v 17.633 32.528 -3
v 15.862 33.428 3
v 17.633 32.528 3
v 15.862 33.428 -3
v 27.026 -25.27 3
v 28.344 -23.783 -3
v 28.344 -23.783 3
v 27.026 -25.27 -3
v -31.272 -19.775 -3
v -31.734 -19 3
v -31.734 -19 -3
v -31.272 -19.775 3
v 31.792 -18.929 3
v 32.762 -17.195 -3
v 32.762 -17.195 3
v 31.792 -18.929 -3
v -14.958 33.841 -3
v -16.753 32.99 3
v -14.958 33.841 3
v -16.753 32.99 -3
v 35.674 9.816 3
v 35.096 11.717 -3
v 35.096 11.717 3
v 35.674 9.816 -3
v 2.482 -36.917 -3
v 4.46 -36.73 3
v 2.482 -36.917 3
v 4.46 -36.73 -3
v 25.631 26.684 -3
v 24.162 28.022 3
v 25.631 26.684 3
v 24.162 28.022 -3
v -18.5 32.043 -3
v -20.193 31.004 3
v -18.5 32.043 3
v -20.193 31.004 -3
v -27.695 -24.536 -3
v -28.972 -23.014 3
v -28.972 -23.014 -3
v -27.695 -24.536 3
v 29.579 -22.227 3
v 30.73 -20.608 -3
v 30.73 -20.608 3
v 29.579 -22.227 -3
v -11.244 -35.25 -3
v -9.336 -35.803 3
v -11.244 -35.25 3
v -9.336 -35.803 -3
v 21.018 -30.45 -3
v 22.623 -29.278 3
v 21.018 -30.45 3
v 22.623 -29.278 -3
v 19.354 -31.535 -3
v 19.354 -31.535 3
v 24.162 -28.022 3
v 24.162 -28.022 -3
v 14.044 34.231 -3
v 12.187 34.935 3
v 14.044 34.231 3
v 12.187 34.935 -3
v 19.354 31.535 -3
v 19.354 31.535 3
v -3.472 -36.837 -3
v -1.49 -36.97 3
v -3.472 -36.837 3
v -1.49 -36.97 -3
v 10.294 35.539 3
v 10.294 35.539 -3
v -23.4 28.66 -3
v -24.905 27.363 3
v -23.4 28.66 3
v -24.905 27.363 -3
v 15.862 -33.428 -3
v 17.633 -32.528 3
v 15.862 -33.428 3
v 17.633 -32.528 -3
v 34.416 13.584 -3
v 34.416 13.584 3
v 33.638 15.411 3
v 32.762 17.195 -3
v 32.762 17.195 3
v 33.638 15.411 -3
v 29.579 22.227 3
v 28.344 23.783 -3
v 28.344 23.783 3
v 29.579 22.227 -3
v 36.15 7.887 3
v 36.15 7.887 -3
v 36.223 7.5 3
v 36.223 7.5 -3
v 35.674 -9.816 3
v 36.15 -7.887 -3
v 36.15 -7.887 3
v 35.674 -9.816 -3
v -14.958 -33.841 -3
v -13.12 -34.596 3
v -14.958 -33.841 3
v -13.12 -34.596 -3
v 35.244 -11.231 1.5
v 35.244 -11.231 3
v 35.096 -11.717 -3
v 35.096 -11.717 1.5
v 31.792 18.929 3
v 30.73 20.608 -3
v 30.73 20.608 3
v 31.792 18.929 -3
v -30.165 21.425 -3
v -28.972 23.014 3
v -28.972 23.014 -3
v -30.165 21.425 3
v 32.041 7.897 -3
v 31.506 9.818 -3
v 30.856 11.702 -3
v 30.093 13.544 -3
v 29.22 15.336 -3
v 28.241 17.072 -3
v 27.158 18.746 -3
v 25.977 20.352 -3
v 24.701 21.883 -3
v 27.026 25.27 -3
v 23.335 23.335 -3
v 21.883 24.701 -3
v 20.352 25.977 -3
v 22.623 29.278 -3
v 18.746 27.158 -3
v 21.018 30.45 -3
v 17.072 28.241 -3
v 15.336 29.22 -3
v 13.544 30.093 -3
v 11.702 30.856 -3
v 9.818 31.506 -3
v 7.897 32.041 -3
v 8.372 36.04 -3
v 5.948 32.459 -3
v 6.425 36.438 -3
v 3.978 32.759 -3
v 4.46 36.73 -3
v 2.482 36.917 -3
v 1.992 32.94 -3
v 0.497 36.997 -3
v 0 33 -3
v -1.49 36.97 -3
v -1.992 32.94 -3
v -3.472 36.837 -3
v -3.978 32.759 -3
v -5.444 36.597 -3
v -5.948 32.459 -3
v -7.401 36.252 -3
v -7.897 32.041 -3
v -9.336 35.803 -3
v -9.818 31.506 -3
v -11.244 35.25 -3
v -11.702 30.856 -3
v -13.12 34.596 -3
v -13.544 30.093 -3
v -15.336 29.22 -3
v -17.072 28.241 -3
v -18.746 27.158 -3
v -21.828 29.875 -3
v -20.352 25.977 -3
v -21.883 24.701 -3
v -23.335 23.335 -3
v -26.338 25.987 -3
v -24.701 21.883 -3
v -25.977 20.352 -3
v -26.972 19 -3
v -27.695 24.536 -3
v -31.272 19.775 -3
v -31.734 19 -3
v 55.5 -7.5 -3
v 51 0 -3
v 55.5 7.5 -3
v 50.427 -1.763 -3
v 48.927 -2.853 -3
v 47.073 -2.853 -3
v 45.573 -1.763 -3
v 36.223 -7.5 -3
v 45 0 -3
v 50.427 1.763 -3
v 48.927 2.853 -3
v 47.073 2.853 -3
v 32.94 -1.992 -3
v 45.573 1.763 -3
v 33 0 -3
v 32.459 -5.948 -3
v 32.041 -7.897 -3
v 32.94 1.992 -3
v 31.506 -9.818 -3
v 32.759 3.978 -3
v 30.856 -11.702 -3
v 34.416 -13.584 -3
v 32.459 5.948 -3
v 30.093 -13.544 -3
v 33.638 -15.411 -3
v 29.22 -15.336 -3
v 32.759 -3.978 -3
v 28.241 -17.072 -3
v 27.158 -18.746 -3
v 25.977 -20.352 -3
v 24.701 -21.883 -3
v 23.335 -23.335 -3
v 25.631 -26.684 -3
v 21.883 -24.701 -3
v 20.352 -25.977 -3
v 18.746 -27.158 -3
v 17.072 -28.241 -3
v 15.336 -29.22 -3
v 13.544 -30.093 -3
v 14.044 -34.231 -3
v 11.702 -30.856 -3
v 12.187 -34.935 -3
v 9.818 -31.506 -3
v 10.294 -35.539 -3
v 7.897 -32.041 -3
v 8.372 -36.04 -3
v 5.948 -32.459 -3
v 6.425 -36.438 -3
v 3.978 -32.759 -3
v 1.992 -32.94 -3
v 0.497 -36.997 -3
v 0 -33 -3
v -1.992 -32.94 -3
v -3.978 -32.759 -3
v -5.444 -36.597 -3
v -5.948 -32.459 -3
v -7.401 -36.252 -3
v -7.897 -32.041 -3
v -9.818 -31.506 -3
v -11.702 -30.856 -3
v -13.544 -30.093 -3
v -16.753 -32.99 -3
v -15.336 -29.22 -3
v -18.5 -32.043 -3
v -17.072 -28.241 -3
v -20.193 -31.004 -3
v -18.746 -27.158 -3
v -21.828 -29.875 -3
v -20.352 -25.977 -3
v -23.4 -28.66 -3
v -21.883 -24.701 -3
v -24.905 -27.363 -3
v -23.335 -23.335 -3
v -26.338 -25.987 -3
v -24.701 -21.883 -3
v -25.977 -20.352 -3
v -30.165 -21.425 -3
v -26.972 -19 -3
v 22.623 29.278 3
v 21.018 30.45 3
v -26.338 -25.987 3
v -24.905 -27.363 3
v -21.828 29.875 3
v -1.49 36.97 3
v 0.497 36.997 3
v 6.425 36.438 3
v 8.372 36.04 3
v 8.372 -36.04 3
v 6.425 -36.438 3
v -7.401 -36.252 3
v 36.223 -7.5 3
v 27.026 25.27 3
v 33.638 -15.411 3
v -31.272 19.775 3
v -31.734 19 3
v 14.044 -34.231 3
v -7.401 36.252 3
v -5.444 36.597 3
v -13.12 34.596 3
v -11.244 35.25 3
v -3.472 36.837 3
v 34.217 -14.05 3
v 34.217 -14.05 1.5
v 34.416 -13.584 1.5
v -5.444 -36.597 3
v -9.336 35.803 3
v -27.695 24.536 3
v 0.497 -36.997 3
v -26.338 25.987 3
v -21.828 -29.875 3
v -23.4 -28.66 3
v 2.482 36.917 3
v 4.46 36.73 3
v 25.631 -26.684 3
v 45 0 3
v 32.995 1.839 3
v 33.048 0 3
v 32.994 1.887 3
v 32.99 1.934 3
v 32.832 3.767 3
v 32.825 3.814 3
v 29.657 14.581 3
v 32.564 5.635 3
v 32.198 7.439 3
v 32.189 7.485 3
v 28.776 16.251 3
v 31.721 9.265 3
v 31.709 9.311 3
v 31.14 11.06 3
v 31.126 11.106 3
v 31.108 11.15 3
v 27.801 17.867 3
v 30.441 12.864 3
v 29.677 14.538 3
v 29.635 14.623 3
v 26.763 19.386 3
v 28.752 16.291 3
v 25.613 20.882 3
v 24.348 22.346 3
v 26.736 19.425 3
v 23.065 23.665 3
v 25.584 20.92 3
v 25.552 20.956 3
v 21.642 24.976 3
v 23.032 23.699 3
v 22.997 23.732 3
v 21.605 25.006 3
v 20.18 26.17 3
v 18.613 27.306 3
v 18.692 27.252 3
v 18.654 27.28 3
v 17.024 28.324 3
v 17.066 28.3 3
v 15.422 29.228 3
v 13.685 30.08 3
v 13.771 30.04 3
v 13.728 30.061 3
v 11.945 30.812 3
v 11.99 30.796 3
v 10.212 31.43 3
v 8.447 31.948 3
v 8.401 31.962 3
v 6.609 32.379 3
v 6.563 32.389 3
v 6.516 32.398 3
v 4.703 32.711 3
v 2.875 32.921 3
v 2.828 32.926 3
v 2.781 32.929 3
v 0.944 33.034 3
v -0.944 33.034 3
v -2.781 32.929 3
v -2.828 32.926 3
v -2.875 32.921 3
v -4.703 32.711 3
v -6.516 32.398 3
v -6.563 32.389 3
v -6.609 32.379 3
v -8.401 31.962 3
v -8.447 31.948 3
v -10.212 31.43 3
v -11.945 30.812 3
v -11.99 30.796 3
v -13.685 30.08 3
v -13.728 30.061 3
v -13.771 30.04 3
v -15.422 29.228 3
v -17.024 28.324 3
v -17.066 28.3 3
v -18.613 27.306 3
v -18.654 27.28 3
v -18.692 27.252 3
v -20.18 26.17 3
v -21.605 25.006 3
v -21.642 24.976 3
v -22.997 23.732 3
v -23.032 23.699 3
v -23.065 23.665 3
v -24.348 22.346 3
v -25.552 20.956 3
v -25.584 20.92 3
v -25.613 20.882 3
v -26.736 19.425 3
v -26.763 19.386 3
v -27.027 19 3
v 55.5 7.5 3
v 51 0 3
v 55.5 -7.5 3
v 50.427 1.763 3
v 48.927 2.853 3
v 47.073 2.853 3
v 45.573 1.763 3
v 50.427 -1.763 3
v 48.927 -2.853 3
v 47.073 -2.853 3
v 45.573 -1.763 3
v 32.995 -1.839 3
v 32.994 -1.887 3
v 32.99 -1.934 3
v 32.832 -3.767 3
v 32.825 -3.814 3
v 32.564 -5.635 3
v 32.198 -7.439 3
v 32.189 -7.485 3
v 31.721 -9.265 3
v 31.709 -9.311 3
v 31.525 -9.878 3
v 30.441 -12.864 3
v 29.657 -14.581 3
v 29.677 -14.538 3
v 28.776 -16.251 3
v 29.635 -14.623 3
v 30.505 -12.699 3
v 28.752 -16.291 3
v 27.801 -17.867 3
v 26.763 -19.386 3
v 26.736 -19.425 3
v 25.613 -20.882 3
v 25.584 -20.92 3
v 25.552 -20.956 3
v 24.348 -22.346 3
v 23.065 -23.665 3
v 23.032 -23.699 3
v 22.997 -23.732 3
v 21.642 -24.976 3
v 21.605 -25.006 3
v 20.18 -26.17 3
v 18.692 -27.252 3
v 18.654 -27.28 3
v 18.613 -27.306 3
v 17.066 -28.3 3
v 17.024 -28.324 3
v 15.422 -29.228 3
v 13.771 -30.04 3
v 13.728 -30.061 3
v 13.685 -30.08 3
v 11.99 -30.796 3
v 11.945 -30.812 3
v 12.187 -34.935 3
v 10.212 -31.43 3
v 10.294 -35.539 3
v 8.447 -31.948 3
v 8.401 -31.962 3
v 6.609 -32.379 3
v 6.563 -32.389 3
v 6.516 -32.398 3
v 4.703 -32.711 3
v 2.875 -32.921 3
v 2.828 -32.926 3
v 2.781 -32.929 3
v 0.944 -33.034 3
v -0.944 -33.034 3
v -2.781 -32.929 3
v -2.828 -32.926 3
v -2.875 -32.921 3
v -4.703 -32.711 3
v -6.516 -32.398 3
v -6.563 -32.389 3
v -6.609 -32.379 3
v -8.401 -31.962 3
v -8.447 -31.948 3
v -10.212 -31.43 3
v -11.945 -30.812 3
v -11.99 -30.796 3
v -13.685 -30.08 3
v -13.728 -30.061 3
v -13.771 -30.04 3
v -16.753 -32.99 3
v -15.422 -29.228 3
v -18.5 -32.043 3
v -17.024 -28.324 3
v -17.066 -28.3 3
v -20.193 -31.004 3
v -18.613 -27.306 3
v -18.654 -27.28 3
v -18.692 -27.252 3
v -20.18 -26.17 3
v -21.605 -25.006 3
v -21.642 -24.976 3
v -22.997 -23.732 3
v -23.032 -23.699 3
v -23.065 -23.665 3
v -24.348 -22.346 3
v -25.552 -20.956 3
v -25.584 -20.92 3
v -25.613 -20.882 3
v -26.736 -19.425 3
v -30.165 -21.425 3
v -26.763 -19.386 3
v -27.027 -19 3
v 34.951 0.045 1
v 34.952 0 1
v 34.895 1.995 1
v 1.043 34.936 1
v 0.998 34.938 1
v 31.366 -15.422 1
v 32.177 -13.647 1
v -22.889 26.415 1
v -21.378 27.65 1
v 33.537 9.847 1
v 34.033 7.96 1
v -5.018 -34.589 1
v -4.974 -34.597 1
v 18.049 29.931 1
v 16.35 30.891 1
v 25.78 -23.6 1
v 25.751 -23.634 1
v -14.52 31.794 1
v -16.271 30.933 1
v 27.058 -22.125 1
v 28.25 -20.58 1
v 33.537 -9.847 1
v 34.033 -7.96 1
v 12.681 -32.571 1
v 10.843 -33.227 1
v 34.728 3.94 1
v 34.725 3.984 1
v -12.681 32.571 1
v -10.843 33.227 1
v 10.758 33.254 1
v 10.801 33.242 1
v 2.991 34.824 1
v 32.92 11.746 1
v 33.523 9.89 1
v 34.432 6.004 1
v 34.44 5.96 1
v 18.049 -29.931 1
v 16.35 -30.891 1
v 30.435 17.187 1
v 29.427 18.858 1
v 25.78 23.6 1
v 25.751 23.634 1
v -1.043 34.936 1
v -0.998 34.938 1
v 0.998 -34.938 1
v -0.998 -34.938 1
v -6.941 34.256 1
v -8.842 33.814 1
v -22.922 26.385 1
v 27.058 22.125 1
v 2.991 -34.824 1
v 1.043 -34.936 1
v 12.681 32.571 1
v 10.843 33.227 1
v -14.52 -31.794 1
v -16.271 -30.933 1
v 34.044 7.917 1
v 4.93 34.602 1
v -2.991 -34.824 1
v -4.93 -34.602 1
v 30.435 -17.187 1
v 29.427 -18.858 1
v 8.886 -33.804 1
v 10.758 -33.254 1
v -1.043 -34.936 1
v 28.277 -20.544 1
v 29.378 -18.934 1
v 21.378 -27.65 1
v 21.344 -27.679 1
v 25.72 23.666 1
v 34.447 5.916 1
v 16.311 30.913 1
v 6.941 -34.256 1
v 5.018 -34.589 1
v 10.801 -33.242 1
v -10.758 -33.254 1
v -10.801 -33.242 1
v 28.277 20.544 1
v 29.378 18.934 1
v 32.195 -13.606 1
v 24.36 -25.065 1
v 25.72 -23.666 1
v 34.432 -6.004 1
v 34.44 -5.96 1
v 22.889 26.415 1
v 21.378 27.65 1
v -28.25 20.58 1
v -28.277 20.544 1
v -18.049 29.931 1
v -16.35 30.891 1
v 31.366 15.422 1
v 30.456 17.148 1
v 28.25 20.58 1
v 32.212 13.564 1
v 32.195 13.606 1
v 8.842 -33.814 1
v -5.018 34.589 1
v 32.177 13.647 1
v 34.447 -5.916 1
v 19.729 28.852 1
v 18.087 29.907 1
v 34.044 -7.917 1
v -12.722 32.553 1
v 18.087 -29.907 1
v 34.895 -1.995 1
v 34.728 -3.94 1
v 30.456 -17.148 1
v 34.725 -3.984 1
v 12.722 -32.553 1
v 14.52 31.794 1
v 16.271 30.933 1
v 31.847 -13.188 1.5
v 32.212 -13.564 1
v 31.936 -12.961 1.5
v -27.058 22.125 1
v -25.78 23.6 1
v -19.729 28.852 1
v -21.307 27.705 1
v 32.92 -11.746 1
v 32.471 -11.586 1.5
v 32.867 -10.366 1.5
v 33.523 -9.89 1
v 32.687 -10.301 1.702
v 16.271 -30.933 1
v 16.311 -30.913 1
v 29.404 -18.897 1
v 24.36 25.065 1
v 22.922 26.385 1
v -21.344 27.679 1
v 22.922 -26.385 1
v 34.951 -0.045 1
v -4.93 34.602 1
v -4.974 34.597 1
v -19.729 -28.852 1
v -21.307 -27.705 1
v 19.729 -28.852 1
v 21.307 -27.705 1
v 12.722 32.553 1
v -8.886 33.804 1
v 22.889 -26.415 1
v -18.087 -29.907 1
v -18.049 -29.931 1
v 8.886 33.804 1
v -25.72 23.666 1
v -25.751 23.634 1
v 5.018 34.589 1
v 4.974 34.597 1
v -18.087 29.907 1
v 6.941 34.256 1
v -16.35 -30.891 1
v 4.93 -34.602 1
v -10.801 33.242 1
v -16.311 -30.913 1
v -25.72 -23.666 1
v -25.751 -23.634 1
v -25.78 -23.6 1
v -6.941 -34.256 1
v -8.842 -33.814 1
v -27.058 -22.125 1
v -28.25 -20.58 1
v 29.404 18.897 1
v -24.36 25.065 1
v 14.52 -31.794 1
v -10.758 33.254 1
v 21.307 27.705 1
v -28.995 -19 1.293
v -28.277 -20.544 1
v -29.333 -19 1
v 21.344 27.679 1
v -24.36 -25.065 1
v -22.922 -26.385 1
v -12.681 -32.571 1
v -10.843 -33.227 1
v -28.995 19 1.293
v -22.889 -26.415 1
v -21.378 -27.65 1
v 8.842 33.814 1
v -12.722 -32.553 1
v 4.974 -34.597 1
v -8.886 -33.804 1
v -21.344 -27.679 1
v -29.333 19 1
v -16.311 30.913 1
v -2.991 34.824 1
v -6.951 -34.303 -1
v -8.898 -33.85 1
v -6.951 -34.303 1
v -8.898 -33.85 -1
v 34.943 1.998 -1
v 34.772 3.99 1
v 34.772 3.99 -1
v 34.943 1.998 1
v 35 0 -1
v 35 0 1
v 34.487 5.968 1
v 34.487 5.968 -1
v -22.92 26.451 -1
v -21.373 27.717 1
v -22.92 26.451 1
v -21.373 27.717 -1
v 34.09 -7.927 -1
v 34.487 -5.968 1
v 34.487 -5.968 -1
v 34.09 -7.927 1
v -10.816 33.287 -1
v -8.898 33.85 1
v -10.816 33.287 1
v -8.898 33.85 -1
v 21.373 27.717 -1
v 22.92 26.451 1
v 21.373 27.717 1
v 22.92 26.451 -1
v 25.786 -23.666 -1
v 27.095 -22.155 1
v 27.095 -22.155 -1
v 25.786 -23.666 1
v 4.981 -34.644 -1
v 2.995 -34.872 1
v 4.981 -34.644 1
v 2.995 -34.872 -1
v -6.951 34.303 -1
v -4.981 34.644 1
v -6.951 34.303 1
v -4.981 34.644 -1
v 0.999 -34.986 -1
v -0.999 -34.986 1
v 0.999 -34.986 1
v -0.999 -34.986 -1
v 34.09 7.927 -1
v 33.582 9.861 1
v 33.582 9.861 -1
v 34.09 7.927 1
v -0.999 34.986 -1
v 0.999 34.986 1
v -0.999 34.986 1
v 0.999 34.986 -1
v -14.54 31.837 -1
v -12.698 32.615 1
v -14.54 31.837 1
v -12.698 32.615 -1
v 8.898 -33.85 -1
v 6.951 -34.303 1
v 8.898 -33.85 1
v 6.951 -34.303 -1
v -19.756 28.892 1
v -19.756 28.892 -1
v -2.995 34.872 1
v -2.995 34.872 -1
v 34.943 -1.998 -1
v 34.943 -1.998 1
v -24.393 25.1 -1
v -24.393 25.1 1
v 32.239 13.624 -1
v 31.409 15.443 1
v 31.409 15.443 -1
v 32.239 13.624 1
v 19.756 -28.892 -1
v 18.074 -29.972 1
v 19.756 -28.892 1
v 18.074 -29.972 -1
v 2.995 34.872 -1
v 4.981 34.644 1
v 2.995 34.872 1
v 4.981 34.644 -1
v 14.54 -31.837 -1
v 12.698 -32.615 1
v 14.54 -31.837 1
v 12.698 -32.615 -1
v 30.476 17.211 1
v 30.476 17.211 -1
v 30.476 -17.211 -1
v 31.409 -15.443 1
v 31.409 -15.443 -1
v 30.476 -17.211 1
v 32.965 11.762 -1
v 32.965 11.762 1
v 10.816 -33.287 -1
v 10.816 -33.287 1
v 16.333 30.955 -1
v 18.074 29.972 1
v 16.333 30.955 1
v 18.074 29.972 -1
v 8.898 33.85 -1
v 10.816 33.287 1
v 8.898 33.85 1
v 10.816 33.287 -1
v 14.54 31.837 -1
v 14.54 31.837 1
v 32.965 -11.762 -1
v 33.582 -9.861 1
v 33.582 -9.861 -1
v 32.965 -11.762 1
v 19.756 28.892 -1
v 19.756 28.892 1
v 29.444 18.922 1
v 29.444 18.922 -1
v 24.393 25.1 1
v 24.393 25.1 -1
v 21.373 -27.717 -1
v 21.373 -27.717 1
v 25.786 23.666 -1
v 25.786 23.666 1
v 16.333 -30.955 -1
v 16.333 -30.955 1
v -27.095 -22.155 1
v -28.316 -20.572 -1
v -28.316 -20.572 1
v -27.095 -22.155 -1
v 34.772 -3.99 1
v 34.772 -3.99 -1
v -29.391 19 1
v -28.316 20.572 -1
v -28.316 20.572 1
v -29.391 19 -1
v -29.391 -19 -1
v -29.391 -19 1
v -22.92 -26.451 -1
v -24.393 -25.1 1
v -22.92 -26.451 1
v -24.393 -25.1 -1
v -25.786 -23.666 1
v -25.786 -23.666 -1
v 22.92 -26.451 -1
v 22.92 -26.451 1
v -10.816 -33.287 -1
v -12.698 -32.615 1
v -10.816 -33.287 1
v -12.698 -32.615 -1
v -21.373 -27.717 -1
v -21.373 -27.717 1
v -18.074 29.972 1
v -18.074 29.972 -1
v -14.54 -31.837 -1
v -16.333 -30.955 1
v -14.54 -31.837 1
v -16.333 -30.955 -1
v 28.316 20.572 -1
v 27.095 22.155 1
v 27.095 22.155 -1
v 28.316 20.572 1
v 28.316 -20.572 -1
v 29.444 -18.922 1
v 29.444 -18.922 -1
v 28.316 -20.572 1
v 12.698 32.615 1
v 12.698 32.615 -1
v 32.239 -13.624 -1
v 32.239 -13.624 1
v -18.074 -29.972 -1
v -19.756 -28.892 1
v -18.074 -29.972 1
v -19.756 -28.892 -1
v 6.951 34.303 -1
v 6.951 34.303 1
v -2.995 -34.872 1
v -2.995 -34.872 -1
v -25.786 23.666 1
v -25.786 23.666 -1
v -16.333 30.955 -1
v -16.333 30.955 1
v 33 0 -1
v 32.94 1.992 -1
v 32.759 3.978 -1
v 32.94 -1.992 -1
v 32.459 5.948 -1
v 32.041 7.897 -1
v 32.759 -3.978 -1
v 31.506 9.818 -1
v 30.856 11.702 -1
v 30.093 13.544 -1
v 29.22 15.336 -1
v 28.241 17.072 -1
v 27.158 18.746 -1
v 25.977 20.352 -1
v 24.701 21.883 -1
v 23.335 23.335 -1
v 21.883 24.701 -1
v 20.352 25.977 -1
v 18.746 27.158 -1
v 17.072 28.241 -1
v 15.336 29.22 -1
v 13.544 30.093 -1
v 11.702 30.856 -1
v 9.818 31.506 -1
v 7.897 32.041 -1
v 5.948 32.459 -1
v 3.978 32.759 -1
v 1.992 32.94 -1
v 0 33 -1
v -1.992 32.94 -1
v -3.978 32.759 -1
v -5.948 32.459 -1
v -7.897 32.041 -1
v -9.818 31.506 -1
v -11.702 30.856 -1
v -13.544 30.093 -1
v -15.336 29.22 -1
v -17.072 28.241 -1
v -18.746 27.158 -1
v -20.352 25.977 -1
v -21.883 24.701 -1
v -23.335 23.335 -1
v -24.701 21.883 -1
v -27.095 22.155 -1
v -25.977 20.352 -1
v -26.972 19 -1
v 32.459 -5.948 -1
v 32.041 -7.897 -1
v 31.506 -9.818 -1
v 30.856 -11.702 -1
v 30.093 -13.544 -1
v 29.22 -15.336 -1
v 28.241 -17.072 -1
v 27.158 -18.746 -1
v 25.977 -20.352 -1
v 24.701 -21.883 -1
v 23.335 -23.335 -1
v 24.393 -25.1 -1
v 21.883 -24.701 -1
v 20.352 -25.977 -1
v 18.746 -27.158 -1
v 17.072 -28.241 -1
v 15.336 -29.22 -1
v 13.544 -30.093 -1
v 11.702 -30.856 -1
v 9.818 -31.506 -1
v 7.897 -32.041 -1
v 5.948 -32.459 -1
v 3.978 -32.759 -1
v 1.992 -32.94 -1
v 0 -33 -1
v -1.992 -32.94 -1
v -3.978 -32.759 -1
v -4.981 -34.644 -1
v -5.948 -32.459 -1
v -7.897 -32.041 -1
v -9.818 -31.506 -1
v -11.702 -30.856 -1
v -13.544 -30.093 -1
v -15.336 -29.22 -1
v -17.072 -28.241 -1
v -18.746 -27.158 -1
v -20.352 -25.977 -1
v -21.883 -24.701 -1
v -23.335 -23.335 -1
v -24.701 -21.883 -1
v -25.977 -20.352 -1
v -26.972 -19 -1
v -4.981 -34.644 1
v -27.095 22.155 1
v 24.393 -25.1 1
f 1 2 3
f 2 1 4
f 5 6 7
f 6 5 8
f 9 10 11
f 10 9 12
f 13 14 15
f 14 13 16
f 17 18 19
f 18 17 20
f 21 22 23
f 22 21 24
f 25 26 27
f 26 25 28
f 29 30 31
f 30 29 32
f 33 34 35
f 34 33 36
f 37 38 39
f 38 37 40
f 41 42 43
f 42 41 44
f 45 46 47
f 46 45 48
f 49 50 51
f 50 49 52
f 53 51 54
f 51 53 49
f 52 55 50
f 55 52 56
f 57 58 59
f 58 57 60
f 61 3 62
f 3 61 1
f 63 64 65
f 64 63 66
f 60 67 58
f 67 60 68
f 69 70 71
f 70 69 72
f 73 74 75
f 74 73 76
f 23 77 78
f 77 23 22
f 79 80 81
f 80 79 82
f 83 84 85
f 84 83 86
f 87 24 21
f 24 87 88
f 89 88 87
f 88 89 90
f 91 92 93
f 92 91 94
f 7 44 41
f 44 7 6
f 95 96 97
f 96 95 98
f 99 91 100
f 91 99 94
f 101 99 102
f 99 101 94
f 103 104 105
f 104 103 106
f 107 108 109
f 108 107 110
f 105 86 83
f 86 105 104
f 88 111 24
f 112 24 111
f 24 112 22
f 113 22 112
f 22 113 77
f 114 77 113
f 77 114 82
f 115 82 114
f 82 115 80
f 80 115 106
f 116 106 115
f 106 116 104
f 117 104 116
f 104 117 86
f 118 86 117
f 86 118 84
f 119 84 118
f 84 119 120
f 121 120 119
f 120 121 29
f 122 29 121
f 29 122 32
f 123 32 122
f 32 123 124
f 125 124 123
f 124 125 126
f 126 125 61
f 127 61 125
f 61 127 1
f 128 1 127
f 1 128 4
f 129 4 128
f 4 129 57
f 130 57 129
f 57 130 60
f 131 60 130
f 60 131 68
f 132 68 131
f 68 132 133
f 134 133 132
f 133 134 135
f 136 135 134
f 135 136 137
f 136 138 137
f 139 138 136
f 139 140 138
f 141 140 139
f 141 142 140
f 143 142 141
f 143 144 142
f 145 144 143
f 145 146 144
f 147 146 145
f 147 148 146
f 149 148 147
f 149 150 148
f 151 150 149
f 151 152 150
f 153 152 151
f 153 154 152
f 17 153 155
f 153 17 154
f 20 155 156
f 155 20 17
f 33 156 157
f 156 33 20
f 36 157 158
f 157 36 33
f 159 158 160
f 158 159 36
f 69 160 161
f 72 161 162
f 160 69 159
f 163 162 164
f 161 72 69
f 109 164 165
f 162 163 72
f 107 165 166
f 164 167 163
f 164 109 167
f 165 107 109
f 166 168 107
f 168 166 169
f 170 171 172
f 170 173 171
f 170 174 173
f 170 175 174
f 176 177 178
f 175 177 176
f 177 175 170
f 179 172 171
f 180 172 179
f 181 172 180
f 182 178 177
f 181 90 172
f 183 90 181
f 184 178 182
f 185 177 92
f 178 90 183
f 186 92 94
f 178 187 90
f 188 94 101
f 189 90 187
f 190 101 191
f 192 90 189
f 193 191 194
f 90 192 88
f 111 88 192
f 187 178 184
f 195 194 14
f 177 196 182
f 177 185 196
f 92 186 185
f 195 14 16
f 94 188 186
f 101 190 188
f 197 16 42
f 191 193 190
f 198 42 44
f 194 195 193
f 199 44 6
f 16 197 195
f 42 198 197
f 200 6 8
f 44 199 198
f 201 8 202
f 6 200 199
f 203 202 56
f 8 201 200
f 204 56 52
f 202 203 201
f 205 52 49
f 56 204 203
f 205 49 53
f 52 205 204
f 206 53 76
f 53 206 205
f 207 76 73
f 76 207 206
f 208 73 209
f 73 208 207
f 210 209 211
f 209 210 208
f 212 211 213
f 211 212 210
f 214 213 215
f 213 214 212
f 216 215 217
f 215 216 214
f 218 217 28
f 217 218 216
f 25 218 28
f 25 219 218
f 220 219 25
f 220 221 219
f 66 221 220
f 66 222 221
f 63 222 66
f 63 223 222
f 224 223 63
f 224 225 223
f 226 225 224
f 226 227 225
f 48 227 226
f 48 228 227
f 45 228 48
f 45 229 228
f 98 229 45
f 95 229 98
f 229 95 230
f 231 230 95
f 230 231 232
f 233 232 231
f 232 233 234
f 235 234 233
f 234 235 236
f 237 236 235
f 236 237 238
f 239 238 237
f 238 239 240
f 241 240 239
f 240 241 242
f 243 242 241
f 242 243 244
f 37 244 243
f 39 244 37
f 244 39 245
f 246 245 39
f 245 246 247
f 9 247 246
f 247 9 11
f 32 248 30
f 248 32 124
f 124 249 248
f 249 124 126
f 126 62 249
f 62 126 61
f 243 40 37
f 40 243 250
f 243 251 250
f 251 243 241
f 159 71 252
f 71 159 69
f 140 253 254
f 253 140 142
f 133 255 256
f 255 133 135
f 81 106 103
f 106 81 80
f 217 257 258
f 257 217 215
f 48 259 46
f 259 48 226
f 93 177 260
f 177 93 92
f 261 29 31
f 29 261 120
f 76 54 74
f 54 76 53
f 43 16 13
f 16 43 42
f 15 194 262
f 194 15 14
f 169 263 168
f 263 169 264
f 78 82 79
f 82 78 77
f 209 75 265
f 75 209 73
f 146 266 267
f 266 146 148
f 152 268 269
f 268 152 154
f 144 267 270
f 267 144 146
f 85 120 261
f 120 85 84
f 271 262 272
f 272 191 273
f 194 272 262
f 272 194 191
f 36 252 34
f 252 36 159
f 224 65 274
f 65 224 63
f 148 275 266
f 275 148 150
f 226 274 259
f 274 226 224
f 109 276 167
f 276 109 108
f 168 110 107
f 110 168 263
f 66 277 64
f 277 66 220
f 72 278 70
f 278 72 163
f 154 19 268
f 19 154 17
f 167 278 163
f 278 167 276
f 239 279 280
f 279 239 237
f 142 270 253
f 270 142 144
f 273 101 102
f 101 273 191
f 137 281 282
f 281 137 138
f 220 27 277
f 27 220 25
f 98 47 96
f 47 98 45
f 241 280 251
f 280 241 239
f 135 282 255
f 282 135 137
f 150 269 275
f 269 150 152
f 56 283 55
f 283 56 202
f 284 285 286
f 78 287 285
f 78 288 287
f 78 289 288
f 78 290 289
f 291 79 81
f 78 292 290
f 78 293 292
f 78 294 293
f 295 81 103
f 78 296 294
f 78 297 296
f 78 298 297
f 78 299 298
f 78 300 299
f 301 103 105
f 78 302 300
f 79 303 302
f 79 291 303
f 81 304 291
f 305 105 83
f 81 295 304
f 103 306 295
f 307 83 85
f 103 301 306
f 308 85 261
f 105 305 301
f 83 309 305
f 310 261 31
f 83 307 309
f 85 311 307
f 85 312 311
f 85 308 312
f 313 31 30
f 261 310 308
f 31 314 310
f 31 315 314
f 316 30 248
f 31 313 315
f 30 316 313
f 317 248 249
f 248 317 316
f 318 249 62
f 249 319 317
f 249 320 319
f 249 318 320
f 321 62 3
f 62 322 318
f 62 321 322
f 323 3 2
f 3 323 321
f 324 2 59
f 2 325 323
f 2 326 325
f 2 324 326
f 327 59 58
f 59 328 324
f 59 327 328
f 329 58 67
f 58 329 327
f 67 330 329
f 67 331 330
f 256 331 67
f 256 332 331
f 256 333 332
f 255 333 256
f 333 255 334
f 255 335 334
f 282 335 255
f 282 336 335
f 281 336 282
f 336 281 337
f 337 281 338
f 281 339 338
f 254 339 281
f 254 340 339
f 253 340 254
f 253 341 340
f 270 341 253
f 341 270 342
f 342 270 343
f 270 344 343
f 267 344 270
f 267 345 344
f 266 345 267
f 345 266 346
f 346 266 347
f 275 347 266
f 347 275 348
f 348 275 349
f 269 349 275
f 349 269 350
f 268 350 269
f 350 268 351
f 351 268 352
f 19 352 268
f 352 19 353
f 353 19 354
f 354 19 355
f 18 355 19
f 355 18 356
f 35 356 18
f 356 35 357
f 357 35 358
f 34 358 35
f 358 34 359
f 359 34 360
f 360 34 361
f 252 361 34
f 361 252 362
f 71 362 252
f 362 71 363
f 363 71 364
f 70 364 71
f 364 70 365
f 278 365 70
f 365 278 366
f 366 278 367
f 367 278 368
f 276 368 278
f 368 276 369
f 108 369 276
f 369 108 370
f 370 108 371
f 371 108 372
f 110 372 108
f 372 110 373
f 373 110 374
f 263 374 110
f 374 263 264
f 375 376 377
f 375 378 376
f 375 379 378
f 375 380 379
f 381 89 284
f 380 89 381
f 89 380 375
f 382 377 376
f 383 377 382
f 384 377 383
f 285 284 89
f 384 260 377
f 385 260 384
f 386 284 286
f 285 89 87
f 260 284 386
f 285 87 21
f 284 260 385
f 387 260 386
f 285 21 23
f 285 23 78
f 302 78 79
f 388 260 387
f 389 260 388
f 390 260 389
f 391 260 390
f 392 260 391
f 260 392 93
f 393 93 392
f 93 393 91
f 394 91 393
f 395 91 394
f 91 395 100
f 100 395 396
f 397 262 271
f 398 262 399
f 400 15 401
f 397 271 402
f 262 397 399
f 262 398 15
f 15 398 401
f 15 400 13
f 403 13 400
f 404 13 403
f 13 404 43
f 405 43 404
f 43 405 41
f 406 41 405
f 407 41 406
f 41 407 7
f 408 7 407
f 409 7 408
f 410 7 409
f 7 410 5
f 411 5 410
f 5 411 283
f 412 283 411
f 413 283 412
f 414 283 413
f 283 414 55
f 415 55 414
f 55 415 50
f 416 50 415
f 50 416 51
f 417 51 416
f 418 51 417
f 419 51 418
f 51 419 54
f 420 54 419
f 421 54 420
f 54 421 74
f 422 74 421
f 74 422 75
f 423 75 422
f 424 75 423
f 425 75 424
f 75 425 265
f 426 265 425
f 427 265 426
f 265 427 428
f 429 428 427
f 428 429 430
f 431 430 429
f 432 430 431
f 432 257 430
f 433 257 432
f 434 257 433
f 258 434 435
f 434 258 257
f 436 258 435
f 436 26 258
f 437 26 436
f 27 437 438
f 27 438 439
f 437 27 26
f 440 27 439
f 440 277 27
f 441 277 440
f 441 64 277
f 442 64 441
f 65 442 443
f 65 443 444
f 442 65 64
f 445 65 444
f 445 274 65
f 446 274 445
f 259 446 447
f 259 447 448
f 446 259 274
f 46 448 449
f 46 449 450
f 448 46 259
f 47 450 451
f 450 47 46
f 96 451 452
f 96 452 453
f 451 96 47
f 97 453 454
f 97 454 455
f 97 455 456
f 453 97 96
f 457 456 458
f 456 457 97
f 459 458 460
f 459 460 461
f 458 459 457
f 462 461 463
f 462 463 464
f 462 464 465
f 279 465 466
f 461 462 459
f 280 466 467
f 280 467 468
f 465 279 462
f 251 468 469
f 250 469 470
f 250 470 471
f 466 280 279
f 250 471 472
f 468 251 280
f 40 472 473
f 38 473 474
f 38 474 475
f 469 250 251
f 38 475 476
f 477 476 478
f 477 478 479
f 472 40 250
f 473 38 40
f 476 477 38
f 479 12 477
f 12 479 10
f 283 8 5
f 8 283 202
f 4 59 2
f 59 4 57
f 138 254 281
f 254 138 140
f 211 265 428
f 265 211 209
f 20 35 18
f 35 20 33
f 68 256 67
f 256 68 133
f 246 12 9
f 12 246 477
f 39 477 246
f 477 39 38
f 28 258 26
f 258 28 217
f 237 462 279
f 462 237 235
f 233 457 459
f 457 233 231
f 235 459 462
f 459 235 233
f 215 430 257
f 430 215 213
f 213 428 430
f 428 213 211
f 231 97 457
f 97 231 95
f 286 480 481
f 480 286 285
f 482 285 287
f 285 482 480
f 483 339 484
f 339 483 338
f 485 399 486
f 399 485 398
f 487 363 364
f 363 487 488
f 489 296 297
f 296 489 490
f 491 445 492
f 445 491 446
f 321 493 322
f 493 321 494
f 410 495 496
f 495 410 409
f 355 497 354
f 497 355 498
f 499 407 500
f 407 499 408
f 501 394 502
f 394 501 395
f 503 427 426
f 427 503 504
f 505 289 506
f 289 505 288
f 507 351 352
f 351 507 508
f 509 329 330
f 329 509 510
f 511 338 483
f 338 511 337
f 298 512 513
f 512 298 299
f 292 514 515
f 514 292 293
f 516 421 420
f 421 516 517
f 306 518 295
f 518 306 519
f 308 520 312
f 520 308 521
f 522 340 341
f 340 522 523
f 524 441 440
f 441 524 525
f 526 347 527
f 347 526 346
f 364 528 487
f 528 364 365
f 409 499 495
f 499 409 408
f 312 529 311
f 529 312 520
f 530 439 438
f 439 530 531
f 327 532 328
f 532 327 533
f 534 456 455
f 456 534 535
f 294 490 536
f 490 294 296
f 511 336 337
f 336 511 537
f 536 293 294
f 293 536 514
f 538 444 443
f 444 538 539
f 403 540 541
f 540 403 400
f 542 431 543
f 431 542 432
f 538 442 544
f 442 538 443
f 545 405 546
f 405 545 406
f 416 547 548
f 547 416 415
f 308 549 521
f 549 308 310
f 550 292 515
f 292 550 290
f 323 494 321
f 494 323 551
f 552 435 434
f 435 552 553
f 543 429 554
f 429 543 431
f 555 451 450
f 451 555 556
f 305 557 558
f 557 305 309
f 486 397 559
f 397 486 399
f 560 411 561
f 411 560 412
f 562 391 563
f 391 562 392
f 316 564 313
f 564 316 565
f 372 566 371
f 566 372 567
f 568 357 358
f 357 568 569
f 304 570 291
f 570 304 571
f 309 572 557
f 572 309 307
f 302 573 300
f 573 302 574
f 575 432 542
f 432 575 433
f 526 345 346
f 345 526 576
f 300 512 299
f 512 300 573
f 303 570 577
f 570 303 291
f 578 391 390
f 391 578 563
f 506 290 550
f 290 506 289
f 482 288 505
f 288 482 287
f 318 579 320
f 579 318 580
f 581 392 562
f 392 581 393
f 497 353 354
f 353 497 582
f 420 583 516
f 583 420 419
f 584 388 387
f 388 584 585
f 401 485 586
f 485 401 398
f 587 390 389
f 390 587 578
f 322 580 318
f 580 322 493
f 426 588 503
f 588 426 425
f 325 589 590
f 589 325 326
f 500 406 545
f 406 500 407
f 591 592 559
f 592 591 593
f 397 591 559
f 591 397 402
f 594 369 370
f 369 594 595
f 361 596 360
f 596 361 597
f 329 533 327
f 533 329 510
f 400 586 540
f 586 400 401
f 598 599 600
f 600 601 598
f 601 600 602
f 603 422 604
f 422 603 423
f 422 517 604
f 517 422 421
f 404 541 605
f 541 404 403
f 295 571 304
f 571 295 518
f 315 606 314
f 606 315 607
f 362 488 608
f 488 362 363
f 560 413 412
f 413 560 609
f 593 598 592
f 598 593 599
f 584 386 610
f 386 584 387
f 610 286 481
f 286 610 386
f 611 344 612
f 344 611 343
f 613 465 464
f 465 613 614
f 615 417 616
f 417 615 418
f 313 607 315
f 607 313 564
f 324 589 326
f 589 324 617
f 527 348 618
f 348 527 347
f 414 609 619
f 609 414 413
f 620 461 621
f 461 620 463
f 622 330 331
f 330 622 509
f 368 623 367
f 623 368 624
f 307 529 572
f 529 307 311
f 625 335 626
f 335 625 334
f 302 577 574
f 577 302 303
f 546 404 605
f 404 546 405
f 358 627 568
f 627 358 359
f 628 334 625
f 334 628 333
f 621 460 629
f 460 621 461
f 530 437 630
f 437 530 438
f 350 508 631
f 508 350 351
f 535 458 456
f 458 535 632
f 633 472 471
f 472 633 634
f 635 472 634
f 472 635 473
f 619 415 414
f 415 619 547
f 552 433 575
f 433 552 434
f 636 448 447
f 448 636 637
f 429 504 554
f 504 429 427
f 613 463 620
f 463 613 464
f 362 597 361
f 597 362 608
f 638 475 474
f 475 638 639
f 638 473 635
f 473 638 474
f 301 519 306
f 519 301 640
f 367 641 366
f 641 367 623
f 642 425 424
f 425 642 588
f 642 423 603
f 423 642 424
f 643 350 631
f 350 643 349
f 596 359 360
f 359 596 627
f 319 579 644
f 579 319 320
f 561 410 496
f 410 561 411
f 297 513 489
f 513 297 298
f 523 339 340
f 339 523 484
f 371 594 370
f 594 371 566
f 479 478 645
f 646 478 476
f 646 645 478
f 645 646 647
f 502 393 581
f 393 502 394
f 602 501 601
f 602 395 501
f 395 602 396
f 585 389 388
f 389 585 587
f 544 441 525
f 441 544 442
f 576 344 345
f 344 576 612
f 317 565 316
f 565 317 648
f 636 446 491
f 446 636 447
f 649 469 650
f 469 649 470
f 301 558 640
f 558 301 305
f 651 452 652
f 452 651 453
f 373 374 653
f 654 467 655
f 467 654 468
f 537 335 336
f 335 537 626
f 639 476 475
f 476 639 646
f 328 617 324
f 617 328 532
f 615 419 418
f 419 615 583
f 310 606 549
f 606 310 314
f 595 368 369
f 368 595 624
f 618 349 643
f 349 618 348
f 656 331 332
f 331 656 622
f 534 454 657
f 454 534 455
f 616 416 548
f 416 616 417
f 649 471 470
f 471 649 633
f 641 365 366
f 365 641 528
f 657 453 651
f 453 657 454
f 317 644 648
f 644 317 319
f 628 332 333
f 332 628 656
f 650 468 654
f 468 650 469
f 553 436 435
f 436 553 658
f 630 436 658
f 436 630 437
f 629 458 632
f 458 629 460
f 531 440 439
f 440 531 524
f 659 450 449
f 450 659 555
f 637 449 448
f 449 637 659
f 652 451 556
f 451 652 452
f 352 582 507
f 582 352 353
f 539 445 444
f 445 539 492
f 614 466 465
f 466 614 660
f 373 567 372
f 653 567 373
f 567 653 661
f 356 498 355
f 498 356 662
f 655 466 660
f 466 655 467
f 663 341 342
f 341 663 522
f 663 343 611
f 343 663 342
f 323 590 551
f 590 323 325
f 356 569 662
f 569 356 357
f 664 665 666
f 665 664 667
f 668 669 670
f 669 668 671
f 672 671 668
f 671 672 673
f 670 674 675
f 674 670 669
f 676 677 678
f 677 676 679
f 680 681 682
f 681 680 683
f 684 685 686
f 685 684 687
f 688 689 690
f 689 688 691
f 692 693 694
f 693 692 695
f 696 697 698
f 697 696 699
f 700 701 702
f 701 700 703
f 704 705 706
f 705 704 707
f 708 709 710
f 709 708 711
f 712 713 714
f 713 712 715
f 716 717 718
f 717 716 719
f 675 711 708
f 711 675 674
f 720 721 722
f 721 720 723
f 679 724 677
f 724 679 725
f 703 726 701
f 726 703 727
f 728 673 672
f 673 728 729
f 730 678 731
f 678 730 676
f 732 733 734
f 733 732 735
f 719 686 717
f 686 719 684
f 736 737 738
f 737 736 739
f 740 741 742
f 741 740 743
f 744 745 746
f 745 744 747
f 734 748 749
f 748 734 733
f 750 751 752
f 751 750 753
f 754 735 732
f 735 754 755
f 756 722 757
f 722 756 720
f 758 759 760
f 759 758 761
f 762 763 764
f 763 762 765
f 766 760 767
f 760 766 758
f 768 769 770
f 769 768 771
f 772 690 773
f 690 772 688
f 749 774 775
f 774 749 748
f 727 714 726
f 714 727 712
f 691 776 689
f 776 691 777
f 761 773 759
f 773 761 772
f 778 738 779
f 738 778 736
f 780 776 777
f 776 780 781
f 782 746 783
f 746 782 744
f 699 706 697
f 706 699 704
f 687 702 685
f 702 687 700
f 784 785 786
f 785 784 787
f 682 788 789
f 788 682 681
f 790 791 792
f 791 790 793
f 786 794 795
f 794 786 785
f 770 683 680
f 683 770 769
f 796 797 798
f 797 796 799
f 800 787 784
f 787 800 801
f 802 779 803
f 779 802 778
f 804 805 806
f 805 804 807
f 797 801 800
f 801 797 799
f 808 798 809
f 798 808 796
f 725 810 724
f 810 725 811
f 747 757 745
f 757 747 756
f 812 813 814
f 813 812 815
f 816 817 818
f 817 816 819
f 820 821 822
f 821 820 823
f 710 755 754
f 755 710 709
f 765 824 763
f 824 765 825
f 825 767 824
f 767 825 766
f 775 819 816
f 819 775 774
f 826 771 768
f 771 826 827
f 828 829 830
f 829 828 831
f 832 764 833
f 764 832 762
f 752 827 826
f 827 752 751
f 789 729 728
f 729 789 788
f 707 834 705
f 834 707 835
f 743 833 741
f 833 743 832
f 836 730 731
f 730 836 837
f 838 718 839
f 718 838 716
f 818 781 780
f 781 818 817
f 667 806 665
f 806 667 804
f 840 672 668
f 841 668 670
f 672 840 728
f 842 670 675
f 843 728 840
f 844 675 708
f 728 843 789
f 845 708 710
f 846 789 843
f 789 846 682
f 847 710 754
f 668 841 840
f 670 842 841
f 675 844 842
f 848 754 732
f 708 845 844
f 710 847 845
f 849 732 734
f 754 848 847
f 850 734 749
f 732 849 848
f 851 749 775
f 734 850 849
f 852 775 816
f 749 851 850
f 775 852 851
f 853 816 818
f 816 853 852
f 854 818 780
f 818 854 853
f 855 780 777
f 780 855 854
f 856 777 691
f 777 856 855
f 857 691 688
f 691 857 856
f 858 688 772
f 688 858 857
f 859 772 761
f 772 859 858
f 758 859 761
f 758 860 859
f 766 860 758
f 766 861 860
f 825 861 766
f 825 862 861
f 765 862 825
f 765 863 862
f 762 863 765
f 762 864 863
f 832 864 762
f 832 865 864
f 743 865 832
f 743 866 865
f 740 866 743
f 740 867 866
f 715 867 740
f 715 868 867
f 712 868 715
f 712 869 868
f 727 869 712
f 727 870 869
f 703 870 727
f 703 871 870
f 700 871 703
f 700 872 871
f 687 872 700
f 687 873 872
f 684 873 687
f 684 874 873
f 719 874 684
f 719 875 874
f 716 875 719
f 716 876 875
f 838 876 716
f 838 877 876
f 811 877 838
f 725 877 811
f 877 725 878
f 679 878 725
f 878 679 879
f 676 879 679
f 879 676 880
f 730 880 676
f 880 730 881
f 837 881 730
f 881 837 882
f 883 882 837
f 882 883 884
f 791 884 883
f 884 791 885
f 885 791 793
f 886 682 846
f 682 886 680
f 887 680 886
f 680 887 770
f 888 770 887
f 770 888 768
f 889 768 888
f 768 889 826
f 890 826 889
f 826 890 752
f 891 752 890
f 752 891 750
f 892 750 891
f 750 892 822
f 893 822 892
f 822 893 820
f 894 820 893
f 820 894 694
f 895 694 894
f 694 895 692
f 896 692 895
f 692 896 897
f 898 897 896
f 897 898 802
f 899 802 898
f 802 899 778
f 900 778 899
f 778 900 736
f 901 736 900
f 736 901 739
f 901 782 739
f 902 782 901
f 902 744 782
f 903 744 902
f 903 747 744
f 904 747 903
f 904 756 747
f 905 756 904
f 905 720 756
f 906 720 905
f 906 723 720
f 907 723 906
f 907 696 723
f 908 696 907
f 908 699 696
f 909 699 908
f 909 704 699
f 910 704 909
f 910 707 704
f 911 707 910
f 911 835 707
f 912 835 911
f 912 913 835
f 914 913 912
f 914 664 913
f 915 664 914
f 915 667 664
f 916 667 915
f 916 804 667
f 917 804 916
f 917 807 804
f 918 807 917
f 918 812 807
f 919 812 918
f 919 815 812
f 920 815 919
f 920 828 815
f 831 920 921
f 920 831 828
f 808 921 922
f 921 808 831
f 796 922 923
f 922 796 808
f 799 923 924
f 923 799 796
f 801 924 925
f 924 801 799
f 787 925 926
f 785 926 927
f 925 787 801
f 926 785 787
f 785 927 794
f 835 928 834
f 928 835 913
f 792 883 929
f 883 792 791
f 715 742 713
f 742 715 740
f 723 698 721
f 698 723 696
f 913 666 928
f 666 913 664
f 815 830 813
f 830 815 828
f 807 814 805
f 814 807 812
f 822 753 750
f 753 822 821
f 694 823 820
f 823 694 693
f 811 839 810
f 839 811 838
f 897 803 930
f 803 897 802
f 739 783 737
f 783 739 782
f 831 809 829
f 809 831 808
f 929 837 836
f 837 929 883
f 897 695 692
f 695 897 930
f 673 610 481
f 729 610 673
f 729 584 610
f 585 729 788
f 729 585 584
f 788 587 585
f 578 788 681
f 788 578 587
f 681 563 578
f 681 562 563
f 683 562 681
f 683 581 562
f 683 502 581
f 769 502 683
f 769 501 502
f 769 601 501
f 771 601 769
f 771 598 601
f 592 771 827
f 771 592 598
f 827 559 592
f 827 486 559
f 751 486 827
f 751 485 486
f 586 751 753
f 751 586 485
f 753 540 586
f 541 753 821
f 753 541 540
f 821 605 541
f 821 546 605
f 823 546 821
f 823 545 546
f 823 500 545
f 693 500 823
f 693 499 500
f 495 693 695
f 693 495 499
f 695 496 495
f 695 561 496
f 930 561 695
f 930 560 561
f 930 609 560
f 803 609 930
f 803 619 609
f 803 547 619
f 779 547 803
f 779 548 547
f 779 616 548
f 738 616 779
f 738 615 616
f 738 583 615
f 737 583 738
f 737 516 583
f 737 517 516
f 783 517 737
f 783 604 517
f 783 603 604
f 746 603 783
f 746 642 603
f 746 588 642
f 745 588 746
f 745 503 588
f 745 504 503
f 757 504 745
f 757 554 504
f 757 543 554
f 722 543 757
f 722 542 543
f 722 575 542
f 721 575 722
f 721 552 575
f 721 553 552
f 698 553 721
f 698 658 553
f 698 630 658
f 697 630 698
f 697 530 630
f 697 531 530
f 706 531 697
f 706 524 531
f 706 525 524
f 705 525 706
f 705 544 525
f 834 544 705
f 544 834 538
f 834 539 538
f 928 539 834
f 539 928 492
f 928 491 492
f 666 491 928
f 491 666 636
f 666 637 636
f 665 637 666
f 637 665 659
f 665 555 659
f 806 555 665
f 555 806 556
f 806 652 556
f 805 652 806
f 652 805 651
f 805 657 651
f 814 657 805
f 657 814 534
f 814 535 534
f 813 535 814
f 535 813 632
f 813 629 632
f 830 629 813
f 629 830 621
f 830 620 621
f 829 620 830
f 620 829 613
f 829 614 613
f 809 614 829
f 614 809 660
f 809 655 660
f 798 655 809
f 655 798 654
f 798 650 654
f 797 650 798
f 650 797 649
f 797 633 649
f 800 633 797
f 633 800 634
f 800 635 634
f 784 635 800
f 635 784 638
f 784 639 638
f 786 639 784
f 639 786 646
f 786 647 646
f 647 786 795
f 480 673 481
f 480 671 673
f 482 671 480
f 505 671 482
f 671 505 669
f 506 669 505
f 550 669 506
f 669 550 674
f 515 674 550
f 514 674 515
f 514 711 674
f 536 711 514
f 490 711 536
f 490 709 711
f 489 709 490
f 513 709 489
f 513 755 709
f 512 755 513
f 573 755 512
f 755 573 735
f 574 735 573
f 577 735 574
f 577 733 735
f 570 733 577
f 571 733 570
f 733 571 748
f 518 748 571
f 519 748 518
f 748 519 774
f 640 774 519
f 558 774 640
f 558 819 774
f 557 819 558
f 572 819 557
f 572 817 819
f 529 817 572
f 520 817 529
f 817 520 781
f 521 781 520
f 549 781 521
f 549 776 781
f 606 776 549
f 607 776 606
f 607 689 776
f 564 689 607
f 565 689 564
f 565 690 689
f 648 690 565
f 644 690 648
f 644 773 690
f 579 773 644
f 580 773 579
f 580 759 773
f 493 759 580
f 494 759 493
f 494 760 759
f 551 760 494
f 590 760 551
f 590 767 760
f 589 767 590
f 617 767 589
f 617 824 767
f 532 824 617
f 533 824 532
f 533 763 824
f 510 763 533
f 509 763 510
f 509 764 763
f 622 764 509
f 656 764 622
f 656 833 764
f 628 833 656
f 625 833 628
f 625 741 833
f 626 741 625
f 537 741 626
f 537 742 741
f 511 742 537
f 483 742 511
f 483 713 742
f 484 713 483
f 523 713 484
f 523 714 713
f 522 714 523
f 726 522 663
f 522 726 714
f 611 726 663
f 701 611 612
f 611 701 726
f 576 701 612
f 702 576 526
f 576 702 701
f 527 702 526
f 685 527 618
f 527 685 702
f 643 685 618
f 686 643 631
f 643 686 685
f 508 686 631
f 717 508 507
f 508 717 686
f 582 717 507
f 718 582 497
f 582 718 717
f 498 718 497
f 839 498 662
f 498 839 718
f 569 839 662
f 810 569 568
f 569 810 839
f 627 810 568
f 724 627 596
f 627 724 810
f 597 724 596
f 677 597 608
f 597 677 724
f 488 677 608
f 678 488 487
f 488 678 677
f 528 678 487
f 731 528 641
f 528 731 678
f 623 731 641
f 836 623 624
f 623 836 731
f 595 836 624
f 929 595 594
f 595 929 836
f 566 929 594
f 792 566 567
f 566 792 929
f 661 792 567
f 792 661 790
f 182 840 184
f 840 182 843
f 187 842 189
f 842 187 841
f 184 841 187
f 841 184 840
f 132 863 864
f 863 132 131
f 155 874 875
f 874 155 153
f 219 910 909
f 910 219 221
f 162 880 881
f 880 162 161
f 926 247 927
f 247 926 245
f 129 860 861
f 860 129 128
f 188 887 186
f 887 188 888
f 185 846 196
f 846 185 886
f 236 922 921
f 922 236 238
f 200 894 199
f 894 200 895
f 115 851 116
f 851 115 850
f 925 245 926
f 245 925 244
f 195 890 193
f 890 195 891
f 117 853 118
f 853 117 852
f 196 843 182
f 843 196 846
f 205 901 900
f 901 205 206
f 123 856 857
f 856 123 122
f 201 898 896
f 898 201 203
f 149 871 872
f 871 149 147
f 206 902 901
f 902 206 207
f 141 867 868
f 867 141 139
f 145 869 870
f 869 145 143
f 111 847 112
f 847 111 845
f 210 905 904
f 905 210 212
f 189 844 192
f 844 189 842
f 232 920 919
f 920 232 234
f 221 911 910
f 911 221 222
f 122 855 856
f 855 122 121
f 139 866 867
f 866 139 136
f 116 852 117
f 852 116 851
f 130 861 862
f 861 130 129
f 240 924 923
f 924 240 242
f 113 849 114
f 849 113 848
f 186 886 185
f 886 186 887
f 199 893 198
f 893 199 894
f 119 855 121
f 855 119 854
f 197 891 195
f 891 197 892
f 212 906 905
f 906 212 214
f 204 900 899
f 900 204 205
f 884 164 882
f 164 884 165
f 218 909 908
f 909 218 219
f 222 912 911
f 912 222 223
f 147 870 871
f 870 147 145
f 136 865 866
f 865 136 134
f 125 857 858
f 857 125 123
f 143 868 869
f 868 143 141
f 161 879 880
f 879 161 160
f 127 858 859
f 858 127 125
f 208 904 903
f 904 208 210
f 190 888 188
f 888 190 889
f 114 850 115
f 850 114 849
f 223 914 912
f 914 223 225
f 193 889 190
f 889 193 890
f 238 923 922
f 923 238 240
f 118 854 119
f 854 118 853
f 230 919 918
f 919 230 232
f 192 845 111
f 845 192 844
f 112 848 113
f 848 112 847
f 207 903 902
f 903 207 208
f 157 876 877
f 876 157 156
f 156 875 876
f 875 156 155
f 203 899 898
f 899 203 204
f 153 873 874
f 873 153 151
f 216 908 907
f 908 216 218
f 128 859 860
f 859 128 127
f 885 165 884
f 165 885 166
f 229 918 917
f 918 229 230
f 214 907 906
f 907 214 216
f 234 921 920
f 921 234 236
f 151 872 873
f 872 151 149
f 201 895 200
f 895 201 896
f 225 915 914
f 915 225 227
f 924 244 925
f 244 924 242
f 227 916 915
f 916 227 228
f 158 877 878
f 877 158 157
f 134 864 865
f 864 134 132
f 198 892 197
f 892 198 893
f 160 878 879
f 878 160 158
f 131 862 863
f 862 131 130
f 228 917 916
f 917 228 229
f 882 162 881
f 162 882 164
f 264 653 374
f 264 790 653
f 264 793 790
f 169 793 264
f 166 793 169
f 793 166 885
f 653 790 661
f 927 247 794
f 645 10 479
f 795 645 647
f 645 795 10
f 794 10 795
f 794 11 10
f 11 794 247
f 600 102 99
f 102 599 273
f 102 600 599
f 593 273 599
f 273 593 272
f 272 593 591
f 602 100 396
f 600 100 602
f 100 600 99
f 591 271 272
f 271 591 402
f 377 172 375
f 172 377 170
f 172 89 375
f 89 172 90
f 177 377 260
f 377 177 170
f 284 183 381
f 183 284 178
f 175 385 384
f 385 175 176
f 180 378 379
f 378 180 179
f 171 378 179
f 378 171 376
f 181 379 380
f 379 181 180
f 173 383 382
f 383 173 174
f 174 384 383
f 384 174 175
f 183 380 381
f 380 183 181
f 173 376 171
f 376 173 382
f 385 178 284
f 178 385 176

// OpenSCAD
//******************************************************************************
// Description:
// 
// A holder for LED ring
//
// default size 80mm
//
//
// Copyright CC-BY-SA Bob Cousins 2011
//
// Revision History:
//
// v1 Initial version. Based on http://www.thingiverse.com/thing:7484
//******************************************************************************

$fa=0.01;
$fn=0;
//$fs=0.5;

//module ref ()
//{
//  translate ([9,0,10])
////  translate ([9,0,-5])
//  import_stl ("C:/BitsFromBytes/things/7484-led-ring/led_ring_holder_01.stl");
//}

module led_ring_holder(diam)
{
  height = 2;
  outer_r = diam/2 + 2;
    
  difference ()
  {
    union ()
    {
      translate ([0,0,0])
        cylinder (r=outer_r, h=height*3, center=true);
    }
    
    translate ([0,0,height])
      cylinder (r1=diam/2, r2=diam/2-2, h=height+0.1, center=true);

    translate ([0,0,0])
      cylinder (r=diam/2, h=height, center=true);

    translate ([0,0,0])
      cylinder (r=diam/2-2, h=height*3+1, center=true);
      
    translate ([-diam/2,0,0])
      cube ([diam/2,38,10], center=true);
      
    // slot for wires            
    rotate ([0,0,-20])
      translate ([diam/2,0, 1.5+2/2])
        cube ([6, 3, 2], center=true);      
  }
}

// for original
module fixing_tabs(diam)
{
  height = 2;
  outer_r = diam/2 + 2;
  
  tab_x = 15;
  tab_y = 15;
  drill_d = 6;
  
  fix_x = (80 + 16)/2;

  difference ()
  {
    union ()
    {
      if (diam <= 80)
      {
        translate ([diam/2, -tab_y/2, -height*3/2])
          cube ([fix_x-diam/2 + tab_x/2, tab_y, height*3], center=false);
      }
      else
      {
        translate ([diam/2 + tab_x/2,0,0])
          cube ([tab_x, tab_y, height*3], center=true);
      }
      
    }
    
    if (diam <= 80)
    {
      translate ([fix_x, 0, 0])
        cylinder (r=drill_d/2, h=height*3+1, center=true);
    }
    else
    {
      translate ([fix_x+(diam-80)/2, 0, 0])
        cylinder (r=drill_d/2, h=height*3+1, center=true);
    }          
  }          
}

module test ()
{
// original STL, for reference
//  ref ();
  
  for (i=[0:3])
  {
    translate ([0,0,-i*10])
    {
      led_ring_holder(60+i*10);
      fixing_tabs(60+i*10);
    }
  }
}

module draw(diam=70)
{
  //Original part

  //diam = 80;
  
  led_ring_holder(diam);
  fixing_tabs(diam);
}

draw();
//test();
